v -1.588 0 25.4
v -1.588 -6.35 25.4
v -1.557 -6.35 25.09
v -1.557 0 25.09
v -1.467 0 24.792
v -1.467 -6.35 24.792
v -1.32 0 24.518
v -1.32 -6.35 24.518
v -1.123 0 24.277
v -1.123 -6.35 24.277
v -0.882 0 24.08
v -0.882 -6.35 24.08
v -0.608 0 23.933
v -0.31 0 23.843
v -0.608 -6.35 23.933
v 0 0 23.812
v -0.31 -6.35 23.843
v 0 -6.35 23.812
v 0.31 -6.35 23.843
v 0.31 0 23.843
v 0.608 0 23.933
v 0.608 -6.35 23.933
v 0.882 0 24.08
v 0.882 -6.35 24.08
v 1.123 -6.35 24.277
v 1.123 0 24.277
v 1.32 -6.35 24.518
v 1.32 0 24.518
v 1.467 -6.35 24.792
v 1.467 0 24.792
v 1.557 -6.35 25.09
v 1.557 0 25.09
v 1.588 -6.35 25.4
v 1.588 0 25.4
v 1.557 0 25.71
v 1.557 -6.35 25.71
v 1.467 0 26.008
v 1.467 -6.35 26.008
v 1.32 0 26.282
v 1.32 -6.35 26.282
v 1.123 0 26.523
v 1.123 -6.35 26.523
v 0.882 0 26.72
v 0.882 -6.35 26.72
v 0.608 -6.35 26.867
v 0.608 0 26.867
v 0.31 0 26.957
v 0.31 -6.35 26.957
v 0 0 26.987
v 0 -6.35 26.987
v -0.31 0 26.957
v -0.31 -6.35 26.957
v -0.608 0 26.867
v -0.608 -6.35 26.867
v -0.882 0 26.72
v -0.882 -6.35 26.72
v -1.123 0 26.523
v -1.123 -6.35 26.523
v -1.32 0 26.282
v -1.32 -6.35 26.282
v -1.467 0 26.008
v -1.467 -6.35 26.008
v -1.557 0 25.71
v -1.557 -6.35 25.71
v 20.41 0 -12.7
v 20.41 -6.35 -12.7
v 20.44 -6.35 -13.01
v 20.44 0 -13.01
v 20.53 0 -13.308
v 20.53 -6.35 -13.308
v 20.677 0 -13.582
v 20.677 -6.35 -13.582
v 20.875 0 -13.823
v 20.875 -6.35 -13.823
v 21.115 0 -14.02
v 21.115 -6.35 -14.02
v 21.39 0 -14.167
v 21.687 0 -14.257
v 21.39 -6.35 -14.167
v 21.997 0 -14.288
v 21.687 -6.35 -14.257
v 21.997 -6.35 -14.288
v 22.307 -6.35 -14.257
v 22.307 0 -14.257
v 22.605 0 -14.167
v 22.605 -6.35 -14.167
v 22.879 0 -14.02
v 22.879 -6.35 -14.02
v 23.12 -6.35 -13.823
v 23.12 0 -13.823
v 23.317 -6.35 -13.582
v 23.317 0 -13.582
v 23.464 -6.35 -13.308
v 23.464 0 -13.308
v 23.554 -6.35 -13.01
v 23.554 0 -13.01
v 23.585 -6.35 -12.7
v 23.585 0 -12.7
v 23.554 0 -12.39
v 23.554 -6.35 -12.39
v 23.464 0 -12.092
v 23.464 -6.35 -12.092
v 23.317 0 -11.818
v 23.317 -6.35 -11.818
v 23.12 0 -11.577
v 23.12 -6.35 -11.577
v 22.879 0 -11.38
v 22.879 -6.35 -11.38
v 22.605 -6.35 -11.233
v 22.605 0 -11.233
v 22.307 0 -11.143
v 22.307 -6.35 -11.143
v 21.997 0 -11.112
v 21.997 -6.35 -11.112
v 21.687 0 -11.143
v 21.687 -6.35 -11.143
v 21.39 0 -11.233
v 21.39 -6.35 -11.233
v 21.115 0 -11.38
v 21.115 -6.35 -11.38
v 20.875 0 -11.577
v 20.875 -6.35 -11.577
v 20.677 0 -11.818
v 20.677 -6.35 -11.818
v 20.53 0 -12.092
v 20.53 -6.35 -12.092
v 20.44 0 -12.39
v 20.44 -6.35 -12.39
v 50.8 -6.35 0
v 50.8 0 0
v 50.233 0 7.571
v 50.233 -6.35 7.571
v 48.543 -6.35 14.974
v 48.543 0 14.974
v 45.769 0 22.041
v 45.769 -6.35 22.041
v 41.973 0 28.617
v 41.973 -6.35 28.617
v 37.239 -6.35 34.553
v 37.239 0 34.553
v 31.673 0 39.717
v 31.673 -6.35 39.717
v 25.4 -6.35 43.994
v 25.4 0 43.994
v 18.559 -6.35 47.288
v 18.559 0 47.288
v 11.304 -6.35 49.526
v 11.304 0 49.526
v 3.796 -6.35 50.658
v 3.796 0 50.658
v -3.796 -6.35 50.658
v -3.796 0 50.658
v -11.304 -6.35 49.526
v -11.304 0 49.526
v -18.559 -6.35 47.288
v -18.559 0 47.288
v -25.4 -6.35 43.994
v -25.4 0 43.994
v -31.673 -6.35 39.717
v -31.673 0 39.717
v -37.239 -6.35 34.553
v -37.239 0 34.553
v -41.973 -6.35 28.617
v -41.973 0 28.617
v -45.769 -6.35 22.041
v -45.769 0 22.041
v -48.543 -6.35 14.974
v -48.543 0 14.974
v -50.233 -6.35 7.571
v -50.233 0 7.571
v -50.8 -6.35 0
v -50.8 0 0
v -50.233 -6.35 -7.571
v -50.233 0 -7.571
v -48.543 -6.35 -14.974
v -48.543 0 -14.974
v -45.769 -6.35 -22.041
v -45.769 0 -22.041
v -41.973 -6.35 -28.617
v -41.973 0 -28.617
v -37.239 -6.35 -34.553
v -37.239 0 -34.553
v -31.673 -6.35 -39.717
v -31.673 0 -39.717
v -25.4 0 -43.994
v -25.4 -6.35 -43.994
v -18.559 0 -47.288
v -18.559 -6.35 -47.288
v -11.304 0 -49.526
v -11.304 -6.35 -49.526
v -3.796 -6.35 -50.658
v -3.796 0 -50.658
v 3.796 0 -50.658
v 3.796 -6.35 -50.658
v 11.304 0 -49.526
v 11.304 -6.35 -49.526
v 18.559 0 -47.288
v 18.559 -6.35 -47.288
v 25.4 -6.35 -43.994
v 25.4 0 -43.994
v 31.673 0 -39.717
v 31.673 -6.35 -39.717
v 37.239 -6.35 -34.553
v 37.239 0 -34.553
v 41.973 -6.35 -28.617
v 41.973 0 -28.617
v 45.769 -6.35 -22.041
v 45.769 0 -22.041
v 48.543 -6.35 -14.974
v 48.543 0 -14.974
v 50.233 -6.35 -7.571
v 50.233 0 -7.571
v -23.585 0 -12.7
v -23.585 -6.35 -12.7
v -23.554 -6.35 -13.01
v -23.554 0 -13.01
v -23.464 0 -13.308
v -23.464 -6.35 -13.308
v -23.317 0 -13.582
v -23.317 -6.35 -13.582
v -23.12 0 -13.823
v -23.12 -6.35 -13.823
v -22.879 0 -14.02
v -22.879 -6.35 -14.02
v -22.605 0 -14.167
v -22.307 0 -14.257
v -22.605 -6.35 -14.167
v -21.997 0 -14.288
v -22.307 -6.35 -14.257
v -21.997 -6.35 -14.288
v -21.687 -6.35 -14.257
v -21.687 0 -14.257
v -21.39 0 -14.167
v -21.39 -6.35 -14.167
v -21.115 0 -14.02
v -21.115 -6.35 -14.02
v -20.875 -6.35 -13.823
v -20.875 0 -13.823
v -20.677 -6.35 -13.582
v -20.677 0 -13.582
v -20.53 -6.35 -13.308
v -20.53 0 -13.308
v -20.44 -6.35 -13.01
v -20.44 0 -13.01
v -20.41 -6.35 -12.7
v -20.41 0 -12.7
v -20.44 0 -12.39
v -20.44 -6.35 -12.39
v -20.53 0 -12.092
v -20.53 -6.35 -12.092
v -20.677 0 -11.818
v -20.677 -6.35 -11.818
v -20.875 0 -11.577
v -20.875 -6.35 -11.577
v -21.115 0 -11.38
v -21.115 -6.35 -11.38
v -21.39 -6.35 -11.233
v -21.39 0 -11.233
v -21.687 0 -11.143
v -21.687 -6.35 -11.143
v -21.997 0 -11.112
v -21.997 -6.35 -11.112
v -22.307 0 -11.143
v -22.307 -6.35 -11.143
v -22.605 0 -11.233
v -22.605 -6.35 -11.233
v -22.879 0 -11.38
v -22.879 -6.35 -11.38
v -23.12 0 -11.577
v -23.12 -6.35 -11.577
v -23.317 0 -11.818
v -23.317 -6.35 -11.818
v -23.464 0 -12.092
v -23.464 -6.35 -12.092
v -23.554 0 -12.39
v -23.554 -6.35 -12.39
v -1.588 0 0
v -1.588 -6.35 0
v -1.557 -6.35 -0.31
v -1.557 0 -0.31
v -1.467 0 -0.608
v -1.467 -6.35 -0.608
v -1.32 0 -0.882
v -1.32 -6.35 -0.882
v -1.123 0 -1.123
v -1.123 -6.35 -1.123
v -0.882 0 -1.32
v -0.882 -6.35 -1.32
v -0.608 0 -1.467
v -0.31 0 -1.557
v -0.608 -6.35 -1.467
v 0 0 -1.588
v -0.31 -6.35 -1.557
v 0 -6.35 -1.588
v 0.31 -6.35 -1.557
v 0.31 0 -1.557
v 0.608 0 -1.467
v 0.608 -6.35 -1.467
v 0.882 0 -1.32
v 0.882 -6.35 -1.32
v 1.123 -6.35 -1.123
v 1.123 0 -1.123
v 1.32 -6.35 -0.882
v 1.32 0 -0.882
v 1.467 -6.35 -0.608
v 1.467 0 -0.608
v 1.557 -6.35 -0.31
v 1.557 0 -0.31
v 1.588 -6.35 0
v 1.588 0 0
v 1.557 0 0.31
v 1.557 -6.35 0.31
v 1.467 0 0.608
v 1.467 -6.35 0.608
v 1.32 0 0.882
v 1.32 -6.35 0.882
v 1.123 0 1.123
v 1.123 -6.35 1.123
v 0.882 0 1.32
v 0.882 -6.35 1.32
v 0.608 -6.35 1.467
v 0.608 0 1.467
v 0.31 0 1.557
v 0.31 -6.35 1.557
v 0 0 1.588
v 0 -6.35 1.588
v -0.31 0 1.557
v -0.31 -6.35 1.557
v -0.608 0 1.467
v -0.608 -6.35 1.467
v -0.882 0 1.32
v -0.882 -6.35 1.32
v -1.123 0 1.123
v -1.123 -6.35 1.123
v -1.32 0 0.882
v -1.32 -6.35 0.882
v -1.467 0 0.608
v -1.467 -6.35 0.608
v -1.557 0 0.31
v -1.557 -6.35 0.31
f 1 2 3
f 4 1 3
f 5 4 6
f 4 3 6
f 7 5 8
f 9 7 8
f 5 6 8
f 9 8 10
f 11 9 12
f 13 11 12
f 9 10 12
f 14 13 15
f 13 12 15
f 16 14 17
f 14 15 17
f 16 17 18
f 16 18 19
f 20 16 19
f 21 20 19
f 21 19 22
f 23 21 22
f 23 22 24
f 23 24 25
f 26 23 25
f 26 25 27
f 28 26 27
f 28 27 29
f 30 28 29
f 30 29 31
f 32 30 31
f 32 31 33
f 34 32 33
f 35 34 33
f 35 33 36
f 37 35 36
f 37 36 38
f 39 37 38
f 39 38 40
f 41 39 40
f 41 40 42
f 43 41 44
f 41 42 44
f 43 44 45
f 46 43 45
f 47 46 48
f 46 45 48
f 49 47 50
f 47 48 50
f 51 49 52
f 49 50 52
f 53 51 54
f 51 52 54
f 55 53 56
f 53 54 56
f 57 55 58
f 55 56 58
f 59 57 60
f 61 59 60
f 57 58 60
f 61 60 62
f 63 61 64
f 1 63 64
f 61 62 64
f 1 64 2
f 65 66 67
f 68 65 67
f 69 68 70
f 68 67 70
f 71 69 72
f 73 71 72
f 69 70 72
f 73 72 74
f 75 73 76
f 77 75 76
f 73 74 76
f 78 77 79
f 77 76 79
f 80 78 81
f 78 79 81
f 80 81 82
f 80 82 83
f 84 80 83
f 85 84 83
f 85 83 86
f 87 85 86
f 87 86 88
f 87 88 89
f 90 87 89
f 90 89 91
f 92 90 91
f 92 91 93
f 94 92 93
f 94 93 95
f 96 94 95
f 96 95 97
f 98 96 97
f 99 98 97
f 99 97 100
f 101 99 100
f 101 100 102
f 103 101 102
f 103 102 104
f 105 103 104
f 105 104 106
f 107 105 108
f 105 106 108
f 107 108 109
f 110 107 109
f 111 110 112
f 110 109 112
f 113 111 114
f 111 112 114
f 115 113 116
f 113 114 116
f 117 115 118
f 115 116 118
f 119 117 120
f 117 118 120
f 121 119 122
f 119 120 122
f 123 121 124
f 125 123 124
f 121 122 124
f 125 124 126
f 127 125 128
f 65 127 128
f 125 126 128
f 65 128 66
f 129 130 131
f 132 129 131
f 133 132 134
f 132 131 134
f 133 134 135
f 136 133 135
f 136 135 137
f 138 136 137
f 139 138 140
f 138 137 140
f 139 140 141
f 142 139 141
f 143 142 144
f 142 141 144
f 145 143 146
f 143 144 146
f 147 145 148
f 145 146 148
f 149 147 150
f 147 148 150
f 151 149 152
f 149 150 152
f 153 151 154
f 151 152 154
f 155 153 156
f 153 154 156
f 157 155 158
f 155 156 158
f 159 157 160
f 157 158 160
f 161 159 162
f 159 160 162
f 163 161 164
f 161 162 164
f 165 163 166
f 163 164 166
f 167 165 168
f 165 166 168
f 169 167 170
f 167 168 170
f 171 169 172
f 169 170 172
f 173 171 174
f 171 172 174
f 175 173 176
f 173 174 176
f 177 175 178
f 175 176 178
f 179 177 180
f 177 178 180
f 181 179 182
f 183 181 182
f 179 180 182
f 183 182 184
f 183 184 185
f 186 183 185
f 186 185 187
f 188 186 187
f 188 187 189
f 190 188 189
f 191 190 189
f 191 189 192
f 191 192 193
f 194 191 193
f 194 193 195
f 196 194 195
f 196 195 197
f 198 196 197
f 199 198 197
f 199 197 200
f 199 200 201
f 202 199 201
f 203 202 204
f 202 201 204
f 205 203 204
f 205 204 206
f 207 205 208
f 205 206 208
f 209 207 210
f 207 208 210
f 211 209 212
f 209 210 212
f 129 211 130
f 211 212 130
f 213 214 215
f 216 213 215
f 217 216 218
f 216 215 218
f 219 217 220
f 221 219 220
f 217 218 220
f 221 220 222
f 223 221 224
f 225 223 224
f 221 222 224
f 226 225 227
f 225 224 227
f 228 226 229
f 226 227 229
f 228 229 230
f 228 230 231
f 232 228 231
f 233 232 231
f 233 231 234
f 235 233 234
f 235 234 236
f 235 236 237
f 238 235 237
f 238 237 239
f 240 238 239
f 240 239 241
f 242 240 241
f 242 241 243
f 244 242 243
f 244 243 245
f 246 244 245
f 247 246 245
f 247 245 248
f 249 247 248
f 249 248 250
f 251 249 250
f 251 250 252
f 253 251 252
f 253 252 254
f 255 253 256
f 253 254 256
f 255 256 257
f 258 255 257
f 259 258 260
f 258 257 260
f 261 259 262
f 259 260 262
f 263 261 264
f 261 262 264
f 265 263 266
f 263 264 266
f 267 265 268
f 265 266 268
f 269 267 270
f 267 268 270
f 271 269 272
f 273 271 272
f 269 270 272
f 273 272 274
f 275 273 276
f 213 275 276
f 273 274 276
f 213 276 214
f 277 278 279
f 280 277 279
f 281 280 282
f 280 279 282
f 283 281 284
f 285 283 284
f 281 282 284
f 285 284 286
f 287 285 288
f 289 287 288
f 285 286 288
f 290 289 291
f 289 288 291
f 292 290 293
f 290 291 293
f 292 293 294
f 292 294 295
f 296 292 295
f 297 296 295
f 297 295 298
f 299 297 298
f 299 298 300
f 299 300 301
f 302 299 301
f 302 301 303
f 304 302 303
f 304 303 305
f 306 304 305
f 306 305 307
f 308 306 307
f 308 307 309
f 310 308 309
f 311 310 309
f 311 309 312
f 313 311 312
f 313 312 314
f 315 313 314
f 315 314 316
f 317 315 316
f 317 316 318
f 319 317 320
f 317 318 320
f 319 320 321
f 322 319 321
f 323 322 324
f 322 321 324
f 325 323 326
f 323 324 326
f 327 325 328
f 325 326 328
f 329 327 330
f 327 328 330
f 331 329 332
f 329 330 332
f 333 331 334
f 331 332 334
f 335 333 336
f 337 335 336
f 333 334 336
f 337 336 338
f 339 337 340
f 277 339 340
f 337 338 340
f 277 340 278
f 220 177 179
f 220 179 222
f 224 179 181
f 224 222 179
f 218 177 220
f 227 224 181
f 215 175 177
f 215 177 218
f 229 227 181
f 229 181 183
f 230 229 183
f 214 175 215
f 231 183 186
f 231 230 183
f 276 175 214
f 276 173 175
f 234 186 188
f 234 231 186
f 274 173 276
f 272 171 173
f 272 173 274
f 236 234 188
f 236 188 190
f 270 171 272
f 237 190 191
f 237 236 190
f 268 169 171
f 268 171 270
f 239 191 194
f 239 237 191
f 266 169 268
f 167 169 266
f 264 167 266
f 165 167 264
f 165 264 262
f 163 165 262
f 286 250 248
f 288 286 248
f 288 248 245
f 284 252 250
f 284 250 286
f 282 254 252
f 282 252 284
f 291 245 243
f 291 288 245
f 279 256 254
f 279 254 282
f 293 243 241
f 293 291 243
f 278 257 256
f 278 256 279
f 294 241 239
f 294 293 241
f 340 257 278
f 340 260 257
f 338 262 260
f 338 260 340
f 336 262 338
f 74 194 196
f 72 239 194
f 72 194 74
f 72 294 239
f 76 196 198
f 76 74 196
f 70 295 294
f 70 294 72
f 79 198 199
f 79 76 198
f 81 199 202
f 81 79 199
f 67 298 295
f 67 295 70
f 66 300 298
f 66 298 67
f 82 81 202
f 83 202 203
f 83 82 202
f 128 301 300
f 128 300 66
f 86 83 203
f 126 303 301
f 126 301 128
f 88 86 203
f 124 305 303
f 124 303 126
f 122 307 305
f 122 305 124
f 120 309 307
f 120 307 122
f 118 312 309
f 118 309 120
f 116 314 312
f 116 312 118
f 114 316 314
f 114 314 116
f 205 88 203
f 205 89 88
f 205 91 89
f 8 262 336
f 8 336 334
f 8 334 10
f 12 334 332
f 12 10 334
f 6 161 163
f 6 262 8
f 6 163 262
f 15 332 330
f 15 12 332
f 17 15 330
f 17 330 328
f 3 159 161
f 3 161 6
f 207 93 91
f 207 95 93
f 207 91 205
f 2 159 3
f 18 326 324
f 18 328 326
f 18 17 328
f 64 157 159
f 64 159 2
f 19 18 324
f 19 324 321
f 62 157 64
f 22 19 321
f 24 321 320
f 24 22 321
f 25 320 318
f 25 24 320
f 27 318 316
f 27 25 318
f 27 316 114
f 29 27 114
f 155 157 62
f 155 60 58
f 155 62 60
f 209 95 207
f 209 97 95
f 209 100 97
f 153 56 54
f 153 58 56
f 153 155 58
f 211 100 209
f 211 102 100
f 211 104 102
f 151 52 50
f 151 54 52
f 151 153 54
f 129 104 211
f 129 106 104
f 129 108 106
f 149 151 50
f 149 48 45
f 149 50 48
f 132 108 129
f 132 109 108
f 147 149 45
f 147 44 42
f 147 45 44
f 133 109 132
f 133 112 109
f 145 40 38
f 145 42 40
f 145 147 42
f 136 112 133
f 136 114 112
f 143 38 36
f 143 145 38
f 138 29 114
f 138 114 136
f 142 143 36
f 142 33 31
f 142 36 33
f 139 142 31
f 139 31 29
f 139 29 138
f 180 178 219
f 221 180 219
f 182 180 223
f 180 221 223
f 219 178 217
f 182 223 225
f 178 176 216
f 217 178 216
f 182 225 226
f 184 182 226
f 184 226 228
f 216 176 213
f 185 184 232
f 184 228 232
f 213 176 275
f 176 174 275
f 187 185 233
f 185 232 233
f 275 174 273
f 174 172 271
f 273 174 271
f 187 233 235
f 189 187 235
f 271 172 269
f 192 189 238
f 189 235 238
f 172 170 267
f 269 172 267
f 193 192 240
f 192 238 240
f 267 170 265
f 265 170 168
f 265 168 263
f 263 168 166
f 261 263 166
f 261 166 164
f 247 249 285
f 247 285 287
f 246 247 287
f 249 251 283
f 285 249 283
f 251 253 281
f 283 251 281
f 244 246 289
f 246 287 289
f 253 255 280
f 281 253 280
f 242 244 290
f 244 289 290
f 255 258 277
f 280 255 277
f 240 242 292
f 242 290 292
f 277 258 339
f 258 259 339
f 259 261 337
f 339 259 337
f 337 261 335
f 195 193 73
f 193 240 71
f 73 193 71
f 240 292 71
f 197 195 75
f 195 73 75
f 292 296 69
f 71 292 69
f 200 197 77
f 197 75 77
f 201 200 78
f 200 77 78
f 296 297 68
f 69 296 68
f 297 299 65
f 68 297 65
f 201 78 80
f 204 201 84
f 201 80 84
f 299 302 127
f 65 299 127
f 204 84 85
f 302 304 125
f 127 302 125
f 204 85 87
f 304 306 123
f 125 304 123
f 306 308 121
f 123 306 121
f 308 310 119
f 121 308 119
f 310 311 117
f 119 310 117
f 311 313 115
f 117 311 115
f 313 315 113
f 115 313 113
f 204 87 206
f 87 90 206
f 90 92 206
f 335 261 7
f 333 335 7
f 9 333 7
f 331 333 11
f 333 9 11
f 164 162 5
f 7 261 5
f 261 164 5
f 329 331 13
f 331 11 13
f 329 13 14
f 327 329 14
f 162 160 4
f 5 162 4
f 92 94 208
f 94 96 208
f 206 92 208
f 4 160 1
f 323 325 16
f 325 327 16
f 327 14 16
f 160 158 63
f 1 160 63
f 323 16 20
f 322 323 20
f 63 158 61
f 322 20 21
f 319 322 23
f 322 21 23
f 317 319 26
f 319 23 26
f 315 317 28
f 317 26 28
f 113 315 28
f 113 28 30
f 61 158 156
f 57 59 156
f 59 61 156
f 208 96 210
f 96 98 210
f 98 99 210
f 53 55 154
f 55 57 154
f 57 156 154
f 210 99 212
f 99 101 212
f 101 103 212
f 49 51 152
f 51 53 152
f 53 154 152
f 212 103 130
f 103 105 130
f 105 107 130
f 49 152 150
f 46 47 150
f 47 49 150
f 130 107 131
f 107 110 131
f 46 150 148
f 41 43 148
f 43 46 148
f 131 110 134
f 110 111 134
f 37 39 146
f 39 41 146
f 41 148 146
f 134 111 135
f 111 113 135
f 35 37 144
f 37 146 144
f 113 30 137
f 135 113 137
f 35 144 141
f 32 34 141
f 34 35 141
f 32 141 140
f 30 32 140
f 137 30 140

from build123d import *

# Parameters (mm, degrees)
F0_R     = 50.8
F1_DEPTH = 6.35
F2_D     = 3.175
F3_D     = 3.175


with BuildPart() as f1:
    # F0 (on Front) → F1 (new body)
    with BuildSketch(Plane.XZ):
        Circle(F0_R)
    extrude(amount=F1_DEPTH)

    # F2 (through all)
    with Locations(Plane(origin=(0, 0, 0), x_dir=(1, 0, 0), z_dir=(0, 1, 0))):
        with Locations((0, 0)):
            Hole(F2_D / 2)

    # F3 (through all)
    with Locations(Plane(origin=(0, 0, 0), x_dir=(1, 0, 0), z_dir=(0, 1, 0))):
        with Locations((0, -25.4), (21.9970452561, 12.7), (-21.9970452561, 12.7)):
            Hole(F3_D / 2)


solid = f1.part
